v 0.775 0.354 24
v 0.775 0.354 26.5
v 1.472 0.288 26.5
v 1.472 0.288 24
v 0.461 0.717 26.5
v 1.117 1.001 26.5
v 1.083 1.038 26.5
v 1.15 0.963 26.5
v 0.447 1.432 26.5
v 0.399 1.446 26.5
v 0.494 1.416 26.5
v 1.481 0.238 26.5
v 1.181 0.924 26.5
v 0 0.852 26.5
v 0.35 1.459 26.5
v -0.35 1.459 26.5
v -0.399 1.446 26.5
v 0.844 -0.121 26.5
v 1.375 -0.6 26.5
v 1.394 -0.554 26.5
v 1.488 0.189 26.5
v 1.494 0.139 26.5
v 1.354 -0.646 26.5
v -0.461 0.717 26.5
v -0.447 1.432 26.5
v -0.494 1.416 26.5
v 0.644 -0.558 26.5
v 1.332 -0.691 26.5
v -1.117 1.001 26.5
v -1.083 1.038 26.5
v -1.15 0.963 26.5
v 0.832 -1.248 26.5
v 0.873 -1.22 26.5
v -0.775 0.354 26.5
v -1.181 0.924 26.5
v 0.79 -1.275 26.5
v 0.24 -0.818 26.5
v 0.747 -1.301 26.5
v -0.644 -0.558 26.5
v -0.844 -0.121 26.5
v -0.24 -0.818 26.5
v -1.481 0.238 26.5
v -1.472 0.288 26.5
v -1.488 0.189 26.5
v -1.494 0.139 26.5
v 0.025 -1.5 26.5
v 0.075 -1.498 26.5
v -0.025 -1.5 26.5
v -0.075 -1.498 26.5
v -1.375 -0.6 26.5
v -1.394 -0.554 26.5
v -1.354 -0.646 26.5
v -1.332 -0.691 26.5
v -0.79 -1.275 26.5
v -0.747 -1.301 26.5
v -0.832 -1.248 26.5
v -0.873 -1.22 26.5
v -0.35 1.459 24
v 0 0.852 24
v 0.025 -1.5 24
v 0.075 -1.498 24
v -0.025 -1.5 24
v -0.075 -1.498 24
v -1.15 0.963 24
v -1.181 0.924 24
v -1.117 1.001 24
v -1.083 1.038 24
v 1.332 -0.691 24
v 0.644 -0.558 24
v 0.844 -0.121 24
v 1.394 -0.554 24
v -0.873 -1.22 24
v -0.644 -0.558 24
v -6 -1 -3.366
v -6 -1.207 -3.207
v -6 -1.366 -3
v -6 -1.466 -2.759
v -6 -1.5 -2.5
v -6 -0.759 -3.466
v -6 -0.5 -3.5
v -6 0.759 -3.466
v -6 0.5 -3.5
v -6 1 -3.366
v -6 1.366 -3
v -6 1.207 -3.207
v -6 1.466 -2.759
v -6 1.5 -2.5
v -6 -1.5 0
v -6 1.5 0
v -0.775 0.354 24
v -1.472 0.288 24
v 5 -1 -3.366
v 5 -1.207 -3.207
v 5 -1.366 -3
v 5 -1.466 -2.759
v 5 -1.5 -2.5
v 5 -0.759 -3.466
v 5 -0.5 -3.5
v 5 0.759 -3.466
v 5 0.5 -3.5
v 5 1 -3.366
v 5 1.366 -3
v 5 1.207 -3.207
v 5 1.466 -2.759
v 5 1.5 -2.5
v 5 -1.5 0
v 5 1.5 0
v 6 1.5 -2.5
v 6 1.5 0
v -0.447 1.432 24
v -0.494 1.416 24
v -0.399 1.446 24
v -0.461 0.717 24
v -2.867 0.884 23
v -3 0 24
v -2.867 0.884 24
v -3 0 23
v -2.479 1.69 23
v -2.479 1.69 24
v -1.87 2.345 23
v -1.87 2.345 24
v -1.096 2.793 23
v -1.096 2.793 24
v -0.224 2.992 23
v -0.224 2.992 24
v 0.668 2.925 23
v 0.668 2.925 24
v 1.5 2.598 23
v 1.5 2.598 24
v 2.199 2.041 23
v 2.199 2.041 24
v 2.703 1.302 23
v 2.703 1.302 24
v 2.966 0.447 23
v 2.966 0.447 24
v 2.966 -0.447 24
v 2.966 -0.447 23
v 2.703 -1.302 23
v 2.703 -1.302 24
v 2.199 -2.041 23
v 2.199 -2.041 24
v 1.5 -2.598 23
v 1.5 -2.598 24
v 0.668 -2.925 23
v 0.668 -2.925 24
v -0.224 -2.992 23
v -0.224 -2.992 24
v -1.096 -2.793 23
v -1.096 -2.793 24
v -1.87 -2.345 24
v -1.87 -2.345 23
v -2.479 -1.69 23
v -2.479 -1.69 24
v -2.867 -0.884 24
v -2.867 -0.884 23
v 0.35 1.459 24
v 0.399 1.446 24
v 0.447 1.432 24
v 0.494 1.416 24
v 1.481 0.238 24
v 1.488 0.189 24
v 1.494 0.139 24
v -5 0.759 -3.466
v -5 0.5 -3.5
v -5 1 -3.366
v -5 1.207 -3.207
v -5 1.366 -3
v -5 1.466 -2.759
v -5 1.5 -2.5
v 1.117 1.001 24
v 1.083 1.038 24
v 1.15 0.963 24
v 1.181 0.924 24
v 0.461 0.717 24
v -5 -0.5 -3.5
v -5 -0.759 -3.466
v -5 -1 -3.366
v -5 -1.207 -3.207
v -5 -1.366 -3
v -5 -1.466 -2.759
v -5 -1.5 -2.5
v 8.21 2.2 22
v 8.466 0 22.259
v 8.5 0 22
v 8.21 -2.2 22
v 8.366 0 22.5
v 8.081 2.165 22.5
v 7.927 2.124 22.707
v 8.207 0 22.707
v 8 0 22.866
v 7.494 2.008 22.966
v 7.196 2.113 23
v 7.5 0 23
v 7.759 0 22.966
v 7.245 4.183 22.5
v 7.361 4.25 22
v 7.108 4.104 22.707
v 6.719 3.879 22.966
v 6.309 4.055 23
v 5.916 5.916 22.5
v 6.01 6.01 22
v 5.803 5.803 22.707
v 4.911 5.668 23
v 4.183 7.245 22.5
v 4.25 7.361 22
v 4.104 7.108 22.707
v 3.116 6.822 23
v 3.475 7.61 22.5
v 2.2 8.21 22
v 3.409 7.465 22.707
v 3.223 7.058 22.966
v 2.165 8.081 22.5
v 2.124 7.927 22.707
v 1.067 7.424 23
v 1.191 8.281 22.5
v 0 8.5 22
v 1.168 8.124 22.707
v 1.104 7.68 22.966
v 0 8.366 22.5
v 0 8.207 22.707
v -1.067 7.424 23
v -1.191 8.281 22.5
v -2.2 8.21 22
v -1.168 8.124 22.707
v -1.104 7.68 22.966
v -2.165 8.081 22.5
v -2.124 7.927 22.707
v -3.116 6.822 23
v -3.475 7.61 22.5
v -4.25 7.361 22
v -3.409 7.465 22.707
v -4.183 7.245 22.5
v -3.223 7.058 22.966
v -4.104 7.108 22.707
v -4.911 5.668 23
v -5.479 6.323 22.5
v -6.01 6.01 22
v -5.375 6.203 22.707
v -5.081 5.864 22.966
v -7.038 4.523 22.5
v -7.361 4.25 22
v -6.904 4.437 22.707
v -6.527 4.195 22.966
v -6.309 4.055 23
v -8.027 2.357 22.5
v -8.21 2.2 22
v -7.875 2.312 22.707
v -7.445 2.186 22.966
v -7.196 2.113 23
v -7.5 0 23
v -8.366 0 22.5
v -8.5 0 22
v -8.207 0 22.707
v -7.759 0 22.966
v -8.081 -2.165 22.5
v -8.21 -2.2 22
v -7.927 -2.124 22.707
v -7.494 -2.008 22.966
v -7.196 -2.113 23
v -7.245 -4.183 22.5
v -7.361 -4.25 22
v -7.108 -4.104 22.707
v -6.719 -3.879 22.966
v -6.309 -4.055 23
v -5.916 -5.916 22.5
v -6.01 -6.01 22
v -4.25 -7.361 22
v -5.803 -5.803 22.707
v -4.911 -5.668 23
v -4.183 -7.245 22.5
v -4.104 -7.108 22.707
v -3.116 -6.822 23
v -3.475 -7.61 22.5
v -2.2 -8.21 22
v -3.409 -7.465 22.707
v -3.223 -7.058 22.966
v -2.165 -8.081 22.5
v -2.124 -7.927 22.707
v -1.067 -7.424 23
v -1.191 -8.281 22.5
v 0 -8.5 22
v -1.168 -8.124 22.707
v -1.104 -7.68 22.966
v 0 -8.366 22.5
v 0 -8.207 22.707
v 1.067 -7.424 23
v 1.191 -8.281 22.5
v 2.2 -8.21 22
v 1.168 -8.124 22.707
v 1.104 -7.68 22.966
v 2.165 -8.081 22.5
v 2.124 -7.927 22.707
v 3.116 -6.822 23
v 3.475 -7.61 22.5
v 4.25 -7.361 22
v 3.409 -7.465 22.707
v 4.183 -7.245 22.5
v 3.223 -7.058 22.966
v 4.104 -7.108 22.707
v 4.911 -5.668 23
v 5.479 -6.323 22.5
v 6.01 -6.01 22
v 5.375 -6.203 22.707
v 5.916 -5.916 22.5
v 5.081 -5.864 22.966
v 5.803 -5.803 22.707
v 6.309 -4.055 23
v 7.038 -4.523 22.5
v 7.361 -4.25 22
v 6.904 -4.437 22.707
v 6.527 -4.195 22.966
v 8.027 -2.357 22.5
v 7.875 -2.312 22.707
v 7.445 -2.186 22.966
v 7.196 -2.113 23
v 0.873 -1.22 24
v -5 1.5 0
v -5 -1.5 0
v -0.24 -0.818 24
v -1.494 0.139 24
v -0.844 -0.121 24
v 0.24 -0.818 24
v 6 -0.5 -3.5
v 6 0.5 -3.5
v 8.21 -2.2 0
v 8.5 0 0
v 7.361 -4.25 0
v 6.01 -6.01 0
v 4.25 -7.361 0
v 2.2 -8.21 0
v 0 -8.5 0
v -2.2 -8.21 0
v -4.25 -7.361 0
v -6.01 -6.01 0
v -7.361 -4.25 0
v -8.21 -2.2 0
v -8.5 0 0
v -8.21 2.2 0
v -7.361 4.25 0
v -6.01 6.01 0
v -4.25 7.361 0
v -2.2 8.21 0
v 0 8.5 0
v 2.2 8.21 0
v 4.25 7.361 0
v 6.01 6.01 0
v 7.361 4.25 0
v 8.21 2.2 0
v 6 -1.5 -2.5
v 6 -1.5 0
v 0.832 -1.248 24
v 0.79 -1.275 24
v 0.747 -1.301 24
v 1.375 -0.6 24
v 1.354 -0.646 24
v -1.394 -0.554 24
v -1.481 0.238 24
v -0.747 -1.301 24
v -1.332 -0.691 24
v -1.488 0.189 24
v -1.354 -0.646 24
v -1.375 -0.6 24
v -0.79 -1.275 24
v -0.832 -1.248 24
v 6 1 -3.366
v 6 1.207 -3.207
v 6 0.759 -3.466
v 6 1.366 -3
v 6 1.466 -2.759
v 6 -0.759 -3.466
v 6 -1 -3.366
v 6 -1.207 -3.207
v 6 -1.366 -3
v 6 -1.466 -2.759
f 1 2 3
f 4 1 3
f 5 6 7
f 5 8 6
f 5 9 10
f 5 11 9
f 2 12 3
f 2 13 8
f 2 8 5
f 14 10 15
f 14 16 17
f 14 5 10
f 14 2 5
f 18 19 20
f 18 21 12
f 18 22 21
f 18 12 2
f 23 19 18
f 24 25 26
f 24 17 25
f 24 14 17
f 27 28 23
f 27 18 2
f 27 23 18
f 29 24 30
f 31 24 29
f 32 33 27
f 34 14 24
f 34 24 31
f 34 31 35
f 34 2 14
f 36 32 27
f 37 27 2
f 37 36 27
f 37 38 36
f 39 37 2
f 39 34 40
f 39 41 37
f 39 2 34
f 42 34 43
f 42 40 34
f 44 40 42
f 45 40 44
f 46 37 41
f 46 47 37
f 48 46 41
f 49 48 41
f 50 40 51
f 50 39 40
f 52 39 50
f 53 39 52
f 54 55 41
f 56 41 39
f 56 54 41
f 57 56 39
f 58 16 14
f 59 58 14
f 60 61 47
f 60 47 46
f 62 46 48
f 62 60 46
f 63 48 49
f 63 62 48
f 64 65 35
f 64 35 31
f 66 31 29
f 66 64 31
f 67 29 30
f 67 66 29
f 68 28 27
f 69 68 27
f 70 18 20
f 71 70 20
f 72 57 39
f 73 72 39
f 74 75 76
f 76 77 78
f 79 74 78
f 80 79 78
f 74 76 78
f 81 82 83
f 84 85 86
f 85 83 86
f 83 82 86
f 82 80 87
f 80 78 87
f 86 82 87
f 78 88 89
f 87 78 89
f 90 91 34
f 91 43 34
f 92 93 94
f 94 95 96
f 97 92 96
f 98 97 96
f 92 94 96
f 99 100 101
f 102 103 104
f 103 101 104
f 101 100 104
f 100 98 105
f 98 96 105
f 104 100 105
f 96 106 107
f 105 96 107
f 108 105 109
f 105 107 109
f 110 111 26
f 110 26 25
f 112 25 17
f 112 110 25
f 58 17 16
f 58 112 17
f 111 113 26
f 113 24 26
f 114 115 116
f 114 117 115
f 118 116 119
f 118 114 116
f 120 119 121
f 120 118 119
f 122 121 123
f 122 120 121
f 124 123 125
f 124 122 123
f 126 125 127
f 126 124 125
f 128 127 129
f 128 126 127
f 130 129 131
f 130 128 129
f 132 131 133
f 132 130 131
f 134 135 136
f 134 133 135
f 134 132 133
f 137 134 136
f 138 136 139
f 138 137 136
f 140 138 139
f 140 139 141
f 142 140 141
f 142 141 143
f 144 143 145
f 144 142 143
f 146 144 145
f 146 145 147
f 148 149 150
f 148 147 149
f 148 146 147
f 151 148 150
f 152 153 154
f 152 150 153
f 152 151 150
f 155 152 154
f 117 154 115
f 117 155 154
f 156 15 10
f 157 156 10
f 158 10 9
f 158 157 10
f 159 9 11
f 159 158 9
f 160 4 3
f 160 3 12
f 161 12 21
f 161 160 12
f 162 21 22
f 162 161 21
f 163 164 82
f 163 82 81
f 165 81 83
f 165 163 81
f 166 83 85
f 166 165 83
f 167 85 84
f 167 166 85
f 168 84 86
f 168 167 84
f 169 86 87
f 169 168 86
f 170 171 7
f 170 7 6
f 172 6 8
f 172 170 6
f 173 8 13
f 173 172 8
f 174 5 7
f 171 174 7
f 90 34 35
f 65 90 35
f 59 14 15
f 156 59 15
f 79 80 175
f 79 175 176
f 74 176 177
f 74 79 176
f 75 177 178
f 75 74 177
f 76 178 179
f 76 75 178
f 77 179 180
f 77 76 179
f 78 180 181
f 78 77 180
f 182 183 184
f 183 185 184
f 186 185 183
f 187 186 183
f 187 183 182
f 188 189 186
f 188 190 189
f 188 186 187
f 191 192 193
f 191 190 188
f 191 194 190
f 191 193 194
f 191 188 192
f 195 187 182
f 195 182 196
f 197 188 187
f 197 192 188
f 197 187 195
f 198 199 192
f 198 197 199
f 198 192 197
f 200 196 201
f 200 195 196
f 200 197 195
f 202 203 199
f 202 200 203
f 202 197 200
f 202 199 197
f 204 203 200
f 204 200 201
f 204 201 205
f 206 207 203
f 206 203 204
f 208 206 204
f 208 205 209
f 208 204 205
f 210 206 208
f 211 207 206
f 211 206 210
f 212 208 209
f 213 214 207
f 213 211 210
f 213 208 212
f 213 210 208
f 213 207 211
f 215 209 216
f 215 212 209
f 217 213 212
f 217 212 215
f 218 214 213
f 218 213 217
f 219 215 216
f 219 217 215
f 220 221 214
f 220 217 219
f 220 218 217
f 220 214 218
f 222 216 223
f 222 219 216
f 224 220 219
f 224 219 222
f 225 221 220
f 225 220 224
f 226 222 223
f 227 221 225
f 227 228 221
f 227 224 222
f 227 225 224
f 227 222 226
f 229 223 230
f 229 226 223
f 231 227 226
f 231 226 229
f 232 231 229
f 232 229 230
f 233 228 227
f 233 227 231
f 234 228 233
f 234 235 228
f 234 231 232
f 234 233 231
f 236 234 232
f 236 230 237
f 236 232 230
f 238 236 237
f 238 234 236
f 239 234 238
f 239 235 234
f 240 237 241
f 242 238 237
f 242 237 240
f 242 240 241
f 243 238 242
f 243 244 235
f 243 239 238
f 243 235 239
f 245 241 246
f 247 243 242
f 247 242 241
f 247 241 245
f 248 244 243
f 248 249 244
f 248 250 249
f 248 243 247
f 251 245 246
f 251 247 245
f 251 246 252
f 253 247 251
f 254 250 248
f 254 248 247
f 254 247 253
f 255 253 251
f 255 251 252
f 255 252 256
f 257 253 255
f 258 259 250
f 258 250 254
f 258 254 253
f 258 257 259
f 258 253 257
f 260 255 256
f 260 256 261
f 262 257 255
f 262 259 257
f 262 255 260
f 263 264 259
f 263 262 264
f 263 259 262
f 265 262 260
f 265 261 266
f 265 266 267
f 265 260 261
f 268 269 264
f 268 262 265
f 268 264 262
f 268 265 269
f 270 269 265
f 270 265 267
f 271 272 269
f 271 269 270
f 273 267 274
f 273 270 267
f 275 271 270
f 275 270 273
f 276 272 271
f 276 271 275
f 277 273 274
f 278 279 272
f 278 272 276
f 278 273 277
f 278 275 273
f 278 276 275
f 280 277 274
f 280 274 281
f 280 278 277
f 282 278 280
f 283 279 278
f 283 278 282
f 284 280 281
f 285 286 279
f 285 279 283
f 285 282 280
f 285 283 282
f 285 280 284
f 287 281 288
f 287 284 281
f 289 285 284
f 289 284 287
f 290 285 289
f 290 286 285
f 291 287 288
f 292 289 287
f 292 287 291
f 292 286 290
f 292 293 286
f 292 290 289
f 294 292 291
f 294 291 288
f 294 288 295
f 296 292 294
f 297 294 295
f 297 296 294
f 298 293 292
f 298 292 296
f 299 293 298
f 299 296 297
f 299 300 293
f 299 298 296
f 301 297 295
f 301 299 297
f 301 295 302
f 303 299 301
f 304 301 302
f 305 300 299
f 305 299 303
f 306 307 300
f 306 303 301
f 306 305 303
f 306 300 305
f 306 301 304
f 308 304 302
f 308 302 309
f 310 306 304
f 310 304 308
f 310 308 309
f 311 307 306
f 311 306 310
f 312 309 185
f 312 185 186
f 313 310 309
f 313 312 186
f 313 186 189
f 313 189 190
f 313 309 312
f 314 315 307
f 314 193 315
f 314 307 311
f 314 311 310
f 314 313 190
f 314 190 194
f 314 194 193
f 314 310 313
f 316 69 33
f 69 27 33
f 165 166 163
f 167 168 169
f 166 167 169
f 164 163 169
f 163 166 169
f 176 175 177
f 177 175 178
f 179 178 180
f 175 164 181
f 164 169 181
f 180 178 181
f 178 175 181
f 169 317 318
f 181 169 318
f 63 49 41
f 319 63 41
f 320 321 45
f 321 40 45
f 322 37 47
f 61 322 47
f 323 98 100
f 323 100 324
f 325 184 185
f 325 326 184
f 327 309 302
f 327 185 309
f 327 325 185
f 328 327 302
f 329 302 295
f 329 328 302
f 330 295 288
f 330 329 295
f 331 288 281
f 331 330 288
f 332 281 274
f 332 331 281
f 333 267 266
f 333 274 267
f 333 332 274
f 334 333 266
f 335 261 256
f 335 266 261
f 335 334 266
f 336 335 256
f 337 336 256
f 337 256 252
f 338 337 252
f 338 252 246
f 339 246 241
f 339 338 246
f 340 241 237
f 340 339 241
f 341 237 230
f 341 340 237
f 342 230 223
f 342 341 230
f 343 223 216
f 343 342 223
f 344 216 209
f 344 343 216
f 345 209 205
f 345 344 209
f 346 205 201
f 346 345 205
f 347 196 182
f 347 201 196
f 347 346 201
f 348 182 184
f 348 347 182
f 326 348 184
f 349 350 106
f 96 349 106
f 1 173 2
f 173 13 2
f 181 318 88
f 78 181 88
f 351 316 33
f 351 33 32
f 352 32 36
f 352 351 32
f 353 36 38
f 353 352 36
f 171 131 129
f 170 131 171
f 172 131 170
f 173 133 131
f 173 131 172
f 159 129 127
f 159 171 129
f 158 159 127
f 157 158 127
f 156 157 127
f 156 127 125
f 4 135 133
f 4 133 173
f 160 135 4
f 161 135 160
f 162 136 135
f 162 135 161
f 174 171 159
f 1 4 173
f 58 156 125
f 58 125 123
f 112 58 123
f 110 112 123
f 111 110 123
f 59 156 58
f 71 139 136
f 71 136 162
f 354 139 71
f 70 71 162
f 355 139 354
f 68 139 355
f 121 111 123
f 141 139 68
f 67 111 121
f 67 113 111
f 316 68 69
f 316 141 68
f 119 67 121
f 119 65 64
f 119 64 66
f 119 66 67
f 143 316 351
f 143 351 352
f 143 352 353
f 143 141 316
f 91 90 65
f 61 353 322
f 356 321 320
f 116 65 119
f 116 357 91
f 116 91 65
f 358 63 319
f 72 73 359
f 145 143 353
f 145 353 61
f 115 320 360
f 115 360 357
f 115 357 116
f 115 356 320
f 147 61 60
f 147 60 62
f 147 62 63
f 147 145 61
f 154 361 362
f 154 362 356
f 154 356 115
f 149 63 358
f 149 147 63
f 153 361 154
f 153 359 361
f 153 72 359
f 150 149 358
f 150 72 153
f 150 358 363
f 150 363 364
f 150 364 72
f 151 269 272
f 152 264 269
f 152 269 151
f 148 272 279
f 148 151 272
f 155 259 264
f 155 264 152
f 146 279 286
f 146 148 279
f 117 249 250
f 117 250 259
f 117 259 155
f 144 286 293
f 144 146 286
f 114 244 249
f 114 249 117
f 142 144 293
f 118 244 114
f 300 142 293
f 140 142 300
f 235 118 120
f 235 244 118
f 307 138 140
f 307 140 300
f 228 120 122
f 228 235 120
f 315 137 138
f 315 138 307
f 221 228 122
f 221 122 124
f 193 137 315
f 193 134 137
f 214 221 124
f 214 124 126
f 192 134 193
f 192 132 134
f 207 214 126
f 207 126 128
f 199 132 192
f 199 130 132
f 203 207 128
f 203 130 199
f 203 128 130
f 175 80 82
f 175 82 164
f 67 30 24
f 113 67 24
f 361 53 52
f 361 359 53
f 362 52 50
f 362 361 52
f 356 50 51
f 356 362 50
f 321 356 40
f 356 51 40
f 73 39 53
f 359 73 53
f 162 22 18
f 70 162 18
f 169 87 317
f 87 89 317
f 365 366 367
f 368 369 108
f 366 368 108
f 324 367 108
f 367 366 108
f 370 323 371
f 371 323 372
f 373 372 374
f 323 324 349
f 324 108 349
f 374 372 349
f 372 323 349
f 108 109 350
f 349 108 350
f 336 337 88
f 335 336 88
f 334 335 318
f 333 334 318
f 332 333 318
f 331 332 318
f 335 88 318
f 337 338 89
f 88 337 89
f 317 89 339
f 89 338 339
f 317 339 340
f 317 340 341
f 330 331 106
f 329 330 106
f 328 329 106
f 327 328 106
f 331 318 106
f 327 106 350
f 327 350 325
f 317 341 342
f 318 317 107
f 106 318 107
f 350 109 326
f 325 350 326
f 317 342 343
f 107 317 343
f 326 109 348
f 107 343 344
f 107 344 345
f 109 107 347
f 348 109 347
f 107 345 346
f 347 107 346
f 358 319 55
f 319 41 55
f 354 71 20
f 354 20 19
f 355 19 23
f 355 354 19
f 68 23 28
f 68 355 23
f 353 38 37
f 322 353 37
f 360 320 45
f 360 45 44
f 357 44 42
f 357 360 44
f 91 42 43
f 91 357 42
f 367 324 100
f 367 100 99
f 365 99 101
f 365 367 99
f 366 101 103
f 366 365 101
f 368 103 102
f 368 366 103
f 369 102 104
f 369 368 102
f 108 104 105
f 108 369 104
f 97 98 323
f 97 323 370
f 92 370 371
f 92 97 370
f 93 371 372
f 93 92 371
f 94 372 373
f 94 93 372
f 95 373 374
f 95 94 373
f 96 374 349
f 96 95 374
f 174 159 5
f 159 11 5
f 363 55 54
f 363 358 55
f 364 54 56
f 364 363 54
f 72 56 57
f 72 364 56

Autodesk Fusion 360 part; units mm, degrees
sketch "Sketch1" plane through (0, 0, 0) normal (0, 0, 1) x (1, 0, 0)
  circle A0 centre (0, 0) radius 8.5
  dimension "d1" = 17
extrude "Extrude1" add sketch "Sketch1" along normal blind 23
sketch "Sketch2" plane through (0, 0, 23) normal (0, 0, 1) x (-1, 0, 0)
  circle A0 centre (0, 0) radius 8.5
  circle A1 centre (0, 0) radius 3
  dimension "d4" = 6
extrude "Extrude2" add sketch "Sketch2" along normal blind 1 contours A1
sketch "Sketch3" plane through (0, 0, 24) normal (0, 0, 1) x (-1, 0, 0)
  circle A0 centre (0, 0) radius 3
  circle A1 centre (0, 0) radius 1.5
  dimension "d7" = 3
extrude "Extrude3" add sketch "Sketch3" along normal blind 2.5 contours A1
fillet "Fillet1" radius 1 1 edges at (-7.9248, -3.0737, 23)
sketch "Sketch4" plane through (0, 0, 0) normal (0, 0, -1) x (1, 0, 0)
  circle A0 centre (0, 0) radius 8.5
  line L0 (-5, 1.5) -> (-6, 1.5)
  line L1 (-6, 1.5) -> (-6, -1.5)
  line L2 (-6, -1.5) -> (-5, -1.5)
  line L3 (-5, -1.5) -> (-5, 1.5)
  line L4 (-5, 1.5) -> (-6, -1.5) construction
  line L5 (-6, 1.5) -> (-5, -1.5) construction
  line L6 (6, 1.5) -> (5, 1.5)
  line L7 (5, 1.5) -> (5, -1.5)
  line L8 (5, -1.5) -> (6, -1.5)
  line L9 (6, -1.5) -> (6, 1.5)
  line L10 (6, 1.5) -> (5, -1.5) construction
  line L11 (5, 1.5) -> (6, -1.5) construction
  point P0 (-5.5, 0)
  point P1 (5.5, 0)
  dimension "d12" = 1
  dimension "d13" = 1
  dimension "d14" = 3
  dimension "d15" = 3
  dimension "d16" = 5
  dimension "d17" = 5
extrude "Extrude4" add sketch "Sketch4" along normal blind 3.5 contours L0 L1 L2 L3 | L6 L7 L8 L9
sketch "Sketch5" plane through (-6, 0, 0) normal (-1, 0, 0) x (0, -1, 0)
  line L0 (1.5, 0) -> (-1.5, 0)
  line L1 (-1.5, 0) -> (-1.5, -3.5)
  line L2 (-1.5, -3.5) -> (1.5, -3.5)
  line L3 (1.5, -3.5) -> (1.5, 0)
  line L4 (0.25, -2.8) -> (0.25, -0.8)
  arc A0 (0.25, -0.8) -> (-0.25, -0.8) centre (0, -0.8) ccw
  line L5 (-0.25, -0.8) -> (-0.25, -2.8)
  arc A1 (-0.25, -2.8) -> (0.25, -2.8) centre (0, -2.8) ccw
  line L6 (0, -2.8) -> (0, -0.8) construction
  point P0 (0, -1.8)
  dimension "d20" = 2
  dimension "d21" = 0.5
  dimension "d22" = 0.7
extrude "Extrude5" cut sketch "Sketch5" along normal through all contours L4 A0 L5 A1
fillet "Fillet2" radius 1 4 edges at (-5.5, 1.5, -3.5) (-5.5, -1.5, -3.5) (5.5, 1.5, -3.5) (5.5, -1.5, -3.5)
sketch "Sketch6" plane through (0, 0, 26.5) normal (0, 0, 1) x (-1, 0, 0)
  circle A0 centre (0, 0) radius 1.5
  circle A1 centre (0, 0) radius 1.5
  line L0 (0.35, -1.4586) -> (0, -0.8524)
  line L1 (0, -0.8524) -> (-0.35, -1.4586)
  dimension "d26" = 0.7
  dimension "d27" = 0.7
  dimension "d28" = 0.7
extrude "Extrude6" cut sketch "Sketch6" against normal blind 2.5 contours A0 A1 L0 L1 picked at (0.0587, -1.2807)
pattern_circular "C-Pattern1" count 11 over 360 about axis through (0, 0, 24) along (0, 0, 1) of "Extrude6"
